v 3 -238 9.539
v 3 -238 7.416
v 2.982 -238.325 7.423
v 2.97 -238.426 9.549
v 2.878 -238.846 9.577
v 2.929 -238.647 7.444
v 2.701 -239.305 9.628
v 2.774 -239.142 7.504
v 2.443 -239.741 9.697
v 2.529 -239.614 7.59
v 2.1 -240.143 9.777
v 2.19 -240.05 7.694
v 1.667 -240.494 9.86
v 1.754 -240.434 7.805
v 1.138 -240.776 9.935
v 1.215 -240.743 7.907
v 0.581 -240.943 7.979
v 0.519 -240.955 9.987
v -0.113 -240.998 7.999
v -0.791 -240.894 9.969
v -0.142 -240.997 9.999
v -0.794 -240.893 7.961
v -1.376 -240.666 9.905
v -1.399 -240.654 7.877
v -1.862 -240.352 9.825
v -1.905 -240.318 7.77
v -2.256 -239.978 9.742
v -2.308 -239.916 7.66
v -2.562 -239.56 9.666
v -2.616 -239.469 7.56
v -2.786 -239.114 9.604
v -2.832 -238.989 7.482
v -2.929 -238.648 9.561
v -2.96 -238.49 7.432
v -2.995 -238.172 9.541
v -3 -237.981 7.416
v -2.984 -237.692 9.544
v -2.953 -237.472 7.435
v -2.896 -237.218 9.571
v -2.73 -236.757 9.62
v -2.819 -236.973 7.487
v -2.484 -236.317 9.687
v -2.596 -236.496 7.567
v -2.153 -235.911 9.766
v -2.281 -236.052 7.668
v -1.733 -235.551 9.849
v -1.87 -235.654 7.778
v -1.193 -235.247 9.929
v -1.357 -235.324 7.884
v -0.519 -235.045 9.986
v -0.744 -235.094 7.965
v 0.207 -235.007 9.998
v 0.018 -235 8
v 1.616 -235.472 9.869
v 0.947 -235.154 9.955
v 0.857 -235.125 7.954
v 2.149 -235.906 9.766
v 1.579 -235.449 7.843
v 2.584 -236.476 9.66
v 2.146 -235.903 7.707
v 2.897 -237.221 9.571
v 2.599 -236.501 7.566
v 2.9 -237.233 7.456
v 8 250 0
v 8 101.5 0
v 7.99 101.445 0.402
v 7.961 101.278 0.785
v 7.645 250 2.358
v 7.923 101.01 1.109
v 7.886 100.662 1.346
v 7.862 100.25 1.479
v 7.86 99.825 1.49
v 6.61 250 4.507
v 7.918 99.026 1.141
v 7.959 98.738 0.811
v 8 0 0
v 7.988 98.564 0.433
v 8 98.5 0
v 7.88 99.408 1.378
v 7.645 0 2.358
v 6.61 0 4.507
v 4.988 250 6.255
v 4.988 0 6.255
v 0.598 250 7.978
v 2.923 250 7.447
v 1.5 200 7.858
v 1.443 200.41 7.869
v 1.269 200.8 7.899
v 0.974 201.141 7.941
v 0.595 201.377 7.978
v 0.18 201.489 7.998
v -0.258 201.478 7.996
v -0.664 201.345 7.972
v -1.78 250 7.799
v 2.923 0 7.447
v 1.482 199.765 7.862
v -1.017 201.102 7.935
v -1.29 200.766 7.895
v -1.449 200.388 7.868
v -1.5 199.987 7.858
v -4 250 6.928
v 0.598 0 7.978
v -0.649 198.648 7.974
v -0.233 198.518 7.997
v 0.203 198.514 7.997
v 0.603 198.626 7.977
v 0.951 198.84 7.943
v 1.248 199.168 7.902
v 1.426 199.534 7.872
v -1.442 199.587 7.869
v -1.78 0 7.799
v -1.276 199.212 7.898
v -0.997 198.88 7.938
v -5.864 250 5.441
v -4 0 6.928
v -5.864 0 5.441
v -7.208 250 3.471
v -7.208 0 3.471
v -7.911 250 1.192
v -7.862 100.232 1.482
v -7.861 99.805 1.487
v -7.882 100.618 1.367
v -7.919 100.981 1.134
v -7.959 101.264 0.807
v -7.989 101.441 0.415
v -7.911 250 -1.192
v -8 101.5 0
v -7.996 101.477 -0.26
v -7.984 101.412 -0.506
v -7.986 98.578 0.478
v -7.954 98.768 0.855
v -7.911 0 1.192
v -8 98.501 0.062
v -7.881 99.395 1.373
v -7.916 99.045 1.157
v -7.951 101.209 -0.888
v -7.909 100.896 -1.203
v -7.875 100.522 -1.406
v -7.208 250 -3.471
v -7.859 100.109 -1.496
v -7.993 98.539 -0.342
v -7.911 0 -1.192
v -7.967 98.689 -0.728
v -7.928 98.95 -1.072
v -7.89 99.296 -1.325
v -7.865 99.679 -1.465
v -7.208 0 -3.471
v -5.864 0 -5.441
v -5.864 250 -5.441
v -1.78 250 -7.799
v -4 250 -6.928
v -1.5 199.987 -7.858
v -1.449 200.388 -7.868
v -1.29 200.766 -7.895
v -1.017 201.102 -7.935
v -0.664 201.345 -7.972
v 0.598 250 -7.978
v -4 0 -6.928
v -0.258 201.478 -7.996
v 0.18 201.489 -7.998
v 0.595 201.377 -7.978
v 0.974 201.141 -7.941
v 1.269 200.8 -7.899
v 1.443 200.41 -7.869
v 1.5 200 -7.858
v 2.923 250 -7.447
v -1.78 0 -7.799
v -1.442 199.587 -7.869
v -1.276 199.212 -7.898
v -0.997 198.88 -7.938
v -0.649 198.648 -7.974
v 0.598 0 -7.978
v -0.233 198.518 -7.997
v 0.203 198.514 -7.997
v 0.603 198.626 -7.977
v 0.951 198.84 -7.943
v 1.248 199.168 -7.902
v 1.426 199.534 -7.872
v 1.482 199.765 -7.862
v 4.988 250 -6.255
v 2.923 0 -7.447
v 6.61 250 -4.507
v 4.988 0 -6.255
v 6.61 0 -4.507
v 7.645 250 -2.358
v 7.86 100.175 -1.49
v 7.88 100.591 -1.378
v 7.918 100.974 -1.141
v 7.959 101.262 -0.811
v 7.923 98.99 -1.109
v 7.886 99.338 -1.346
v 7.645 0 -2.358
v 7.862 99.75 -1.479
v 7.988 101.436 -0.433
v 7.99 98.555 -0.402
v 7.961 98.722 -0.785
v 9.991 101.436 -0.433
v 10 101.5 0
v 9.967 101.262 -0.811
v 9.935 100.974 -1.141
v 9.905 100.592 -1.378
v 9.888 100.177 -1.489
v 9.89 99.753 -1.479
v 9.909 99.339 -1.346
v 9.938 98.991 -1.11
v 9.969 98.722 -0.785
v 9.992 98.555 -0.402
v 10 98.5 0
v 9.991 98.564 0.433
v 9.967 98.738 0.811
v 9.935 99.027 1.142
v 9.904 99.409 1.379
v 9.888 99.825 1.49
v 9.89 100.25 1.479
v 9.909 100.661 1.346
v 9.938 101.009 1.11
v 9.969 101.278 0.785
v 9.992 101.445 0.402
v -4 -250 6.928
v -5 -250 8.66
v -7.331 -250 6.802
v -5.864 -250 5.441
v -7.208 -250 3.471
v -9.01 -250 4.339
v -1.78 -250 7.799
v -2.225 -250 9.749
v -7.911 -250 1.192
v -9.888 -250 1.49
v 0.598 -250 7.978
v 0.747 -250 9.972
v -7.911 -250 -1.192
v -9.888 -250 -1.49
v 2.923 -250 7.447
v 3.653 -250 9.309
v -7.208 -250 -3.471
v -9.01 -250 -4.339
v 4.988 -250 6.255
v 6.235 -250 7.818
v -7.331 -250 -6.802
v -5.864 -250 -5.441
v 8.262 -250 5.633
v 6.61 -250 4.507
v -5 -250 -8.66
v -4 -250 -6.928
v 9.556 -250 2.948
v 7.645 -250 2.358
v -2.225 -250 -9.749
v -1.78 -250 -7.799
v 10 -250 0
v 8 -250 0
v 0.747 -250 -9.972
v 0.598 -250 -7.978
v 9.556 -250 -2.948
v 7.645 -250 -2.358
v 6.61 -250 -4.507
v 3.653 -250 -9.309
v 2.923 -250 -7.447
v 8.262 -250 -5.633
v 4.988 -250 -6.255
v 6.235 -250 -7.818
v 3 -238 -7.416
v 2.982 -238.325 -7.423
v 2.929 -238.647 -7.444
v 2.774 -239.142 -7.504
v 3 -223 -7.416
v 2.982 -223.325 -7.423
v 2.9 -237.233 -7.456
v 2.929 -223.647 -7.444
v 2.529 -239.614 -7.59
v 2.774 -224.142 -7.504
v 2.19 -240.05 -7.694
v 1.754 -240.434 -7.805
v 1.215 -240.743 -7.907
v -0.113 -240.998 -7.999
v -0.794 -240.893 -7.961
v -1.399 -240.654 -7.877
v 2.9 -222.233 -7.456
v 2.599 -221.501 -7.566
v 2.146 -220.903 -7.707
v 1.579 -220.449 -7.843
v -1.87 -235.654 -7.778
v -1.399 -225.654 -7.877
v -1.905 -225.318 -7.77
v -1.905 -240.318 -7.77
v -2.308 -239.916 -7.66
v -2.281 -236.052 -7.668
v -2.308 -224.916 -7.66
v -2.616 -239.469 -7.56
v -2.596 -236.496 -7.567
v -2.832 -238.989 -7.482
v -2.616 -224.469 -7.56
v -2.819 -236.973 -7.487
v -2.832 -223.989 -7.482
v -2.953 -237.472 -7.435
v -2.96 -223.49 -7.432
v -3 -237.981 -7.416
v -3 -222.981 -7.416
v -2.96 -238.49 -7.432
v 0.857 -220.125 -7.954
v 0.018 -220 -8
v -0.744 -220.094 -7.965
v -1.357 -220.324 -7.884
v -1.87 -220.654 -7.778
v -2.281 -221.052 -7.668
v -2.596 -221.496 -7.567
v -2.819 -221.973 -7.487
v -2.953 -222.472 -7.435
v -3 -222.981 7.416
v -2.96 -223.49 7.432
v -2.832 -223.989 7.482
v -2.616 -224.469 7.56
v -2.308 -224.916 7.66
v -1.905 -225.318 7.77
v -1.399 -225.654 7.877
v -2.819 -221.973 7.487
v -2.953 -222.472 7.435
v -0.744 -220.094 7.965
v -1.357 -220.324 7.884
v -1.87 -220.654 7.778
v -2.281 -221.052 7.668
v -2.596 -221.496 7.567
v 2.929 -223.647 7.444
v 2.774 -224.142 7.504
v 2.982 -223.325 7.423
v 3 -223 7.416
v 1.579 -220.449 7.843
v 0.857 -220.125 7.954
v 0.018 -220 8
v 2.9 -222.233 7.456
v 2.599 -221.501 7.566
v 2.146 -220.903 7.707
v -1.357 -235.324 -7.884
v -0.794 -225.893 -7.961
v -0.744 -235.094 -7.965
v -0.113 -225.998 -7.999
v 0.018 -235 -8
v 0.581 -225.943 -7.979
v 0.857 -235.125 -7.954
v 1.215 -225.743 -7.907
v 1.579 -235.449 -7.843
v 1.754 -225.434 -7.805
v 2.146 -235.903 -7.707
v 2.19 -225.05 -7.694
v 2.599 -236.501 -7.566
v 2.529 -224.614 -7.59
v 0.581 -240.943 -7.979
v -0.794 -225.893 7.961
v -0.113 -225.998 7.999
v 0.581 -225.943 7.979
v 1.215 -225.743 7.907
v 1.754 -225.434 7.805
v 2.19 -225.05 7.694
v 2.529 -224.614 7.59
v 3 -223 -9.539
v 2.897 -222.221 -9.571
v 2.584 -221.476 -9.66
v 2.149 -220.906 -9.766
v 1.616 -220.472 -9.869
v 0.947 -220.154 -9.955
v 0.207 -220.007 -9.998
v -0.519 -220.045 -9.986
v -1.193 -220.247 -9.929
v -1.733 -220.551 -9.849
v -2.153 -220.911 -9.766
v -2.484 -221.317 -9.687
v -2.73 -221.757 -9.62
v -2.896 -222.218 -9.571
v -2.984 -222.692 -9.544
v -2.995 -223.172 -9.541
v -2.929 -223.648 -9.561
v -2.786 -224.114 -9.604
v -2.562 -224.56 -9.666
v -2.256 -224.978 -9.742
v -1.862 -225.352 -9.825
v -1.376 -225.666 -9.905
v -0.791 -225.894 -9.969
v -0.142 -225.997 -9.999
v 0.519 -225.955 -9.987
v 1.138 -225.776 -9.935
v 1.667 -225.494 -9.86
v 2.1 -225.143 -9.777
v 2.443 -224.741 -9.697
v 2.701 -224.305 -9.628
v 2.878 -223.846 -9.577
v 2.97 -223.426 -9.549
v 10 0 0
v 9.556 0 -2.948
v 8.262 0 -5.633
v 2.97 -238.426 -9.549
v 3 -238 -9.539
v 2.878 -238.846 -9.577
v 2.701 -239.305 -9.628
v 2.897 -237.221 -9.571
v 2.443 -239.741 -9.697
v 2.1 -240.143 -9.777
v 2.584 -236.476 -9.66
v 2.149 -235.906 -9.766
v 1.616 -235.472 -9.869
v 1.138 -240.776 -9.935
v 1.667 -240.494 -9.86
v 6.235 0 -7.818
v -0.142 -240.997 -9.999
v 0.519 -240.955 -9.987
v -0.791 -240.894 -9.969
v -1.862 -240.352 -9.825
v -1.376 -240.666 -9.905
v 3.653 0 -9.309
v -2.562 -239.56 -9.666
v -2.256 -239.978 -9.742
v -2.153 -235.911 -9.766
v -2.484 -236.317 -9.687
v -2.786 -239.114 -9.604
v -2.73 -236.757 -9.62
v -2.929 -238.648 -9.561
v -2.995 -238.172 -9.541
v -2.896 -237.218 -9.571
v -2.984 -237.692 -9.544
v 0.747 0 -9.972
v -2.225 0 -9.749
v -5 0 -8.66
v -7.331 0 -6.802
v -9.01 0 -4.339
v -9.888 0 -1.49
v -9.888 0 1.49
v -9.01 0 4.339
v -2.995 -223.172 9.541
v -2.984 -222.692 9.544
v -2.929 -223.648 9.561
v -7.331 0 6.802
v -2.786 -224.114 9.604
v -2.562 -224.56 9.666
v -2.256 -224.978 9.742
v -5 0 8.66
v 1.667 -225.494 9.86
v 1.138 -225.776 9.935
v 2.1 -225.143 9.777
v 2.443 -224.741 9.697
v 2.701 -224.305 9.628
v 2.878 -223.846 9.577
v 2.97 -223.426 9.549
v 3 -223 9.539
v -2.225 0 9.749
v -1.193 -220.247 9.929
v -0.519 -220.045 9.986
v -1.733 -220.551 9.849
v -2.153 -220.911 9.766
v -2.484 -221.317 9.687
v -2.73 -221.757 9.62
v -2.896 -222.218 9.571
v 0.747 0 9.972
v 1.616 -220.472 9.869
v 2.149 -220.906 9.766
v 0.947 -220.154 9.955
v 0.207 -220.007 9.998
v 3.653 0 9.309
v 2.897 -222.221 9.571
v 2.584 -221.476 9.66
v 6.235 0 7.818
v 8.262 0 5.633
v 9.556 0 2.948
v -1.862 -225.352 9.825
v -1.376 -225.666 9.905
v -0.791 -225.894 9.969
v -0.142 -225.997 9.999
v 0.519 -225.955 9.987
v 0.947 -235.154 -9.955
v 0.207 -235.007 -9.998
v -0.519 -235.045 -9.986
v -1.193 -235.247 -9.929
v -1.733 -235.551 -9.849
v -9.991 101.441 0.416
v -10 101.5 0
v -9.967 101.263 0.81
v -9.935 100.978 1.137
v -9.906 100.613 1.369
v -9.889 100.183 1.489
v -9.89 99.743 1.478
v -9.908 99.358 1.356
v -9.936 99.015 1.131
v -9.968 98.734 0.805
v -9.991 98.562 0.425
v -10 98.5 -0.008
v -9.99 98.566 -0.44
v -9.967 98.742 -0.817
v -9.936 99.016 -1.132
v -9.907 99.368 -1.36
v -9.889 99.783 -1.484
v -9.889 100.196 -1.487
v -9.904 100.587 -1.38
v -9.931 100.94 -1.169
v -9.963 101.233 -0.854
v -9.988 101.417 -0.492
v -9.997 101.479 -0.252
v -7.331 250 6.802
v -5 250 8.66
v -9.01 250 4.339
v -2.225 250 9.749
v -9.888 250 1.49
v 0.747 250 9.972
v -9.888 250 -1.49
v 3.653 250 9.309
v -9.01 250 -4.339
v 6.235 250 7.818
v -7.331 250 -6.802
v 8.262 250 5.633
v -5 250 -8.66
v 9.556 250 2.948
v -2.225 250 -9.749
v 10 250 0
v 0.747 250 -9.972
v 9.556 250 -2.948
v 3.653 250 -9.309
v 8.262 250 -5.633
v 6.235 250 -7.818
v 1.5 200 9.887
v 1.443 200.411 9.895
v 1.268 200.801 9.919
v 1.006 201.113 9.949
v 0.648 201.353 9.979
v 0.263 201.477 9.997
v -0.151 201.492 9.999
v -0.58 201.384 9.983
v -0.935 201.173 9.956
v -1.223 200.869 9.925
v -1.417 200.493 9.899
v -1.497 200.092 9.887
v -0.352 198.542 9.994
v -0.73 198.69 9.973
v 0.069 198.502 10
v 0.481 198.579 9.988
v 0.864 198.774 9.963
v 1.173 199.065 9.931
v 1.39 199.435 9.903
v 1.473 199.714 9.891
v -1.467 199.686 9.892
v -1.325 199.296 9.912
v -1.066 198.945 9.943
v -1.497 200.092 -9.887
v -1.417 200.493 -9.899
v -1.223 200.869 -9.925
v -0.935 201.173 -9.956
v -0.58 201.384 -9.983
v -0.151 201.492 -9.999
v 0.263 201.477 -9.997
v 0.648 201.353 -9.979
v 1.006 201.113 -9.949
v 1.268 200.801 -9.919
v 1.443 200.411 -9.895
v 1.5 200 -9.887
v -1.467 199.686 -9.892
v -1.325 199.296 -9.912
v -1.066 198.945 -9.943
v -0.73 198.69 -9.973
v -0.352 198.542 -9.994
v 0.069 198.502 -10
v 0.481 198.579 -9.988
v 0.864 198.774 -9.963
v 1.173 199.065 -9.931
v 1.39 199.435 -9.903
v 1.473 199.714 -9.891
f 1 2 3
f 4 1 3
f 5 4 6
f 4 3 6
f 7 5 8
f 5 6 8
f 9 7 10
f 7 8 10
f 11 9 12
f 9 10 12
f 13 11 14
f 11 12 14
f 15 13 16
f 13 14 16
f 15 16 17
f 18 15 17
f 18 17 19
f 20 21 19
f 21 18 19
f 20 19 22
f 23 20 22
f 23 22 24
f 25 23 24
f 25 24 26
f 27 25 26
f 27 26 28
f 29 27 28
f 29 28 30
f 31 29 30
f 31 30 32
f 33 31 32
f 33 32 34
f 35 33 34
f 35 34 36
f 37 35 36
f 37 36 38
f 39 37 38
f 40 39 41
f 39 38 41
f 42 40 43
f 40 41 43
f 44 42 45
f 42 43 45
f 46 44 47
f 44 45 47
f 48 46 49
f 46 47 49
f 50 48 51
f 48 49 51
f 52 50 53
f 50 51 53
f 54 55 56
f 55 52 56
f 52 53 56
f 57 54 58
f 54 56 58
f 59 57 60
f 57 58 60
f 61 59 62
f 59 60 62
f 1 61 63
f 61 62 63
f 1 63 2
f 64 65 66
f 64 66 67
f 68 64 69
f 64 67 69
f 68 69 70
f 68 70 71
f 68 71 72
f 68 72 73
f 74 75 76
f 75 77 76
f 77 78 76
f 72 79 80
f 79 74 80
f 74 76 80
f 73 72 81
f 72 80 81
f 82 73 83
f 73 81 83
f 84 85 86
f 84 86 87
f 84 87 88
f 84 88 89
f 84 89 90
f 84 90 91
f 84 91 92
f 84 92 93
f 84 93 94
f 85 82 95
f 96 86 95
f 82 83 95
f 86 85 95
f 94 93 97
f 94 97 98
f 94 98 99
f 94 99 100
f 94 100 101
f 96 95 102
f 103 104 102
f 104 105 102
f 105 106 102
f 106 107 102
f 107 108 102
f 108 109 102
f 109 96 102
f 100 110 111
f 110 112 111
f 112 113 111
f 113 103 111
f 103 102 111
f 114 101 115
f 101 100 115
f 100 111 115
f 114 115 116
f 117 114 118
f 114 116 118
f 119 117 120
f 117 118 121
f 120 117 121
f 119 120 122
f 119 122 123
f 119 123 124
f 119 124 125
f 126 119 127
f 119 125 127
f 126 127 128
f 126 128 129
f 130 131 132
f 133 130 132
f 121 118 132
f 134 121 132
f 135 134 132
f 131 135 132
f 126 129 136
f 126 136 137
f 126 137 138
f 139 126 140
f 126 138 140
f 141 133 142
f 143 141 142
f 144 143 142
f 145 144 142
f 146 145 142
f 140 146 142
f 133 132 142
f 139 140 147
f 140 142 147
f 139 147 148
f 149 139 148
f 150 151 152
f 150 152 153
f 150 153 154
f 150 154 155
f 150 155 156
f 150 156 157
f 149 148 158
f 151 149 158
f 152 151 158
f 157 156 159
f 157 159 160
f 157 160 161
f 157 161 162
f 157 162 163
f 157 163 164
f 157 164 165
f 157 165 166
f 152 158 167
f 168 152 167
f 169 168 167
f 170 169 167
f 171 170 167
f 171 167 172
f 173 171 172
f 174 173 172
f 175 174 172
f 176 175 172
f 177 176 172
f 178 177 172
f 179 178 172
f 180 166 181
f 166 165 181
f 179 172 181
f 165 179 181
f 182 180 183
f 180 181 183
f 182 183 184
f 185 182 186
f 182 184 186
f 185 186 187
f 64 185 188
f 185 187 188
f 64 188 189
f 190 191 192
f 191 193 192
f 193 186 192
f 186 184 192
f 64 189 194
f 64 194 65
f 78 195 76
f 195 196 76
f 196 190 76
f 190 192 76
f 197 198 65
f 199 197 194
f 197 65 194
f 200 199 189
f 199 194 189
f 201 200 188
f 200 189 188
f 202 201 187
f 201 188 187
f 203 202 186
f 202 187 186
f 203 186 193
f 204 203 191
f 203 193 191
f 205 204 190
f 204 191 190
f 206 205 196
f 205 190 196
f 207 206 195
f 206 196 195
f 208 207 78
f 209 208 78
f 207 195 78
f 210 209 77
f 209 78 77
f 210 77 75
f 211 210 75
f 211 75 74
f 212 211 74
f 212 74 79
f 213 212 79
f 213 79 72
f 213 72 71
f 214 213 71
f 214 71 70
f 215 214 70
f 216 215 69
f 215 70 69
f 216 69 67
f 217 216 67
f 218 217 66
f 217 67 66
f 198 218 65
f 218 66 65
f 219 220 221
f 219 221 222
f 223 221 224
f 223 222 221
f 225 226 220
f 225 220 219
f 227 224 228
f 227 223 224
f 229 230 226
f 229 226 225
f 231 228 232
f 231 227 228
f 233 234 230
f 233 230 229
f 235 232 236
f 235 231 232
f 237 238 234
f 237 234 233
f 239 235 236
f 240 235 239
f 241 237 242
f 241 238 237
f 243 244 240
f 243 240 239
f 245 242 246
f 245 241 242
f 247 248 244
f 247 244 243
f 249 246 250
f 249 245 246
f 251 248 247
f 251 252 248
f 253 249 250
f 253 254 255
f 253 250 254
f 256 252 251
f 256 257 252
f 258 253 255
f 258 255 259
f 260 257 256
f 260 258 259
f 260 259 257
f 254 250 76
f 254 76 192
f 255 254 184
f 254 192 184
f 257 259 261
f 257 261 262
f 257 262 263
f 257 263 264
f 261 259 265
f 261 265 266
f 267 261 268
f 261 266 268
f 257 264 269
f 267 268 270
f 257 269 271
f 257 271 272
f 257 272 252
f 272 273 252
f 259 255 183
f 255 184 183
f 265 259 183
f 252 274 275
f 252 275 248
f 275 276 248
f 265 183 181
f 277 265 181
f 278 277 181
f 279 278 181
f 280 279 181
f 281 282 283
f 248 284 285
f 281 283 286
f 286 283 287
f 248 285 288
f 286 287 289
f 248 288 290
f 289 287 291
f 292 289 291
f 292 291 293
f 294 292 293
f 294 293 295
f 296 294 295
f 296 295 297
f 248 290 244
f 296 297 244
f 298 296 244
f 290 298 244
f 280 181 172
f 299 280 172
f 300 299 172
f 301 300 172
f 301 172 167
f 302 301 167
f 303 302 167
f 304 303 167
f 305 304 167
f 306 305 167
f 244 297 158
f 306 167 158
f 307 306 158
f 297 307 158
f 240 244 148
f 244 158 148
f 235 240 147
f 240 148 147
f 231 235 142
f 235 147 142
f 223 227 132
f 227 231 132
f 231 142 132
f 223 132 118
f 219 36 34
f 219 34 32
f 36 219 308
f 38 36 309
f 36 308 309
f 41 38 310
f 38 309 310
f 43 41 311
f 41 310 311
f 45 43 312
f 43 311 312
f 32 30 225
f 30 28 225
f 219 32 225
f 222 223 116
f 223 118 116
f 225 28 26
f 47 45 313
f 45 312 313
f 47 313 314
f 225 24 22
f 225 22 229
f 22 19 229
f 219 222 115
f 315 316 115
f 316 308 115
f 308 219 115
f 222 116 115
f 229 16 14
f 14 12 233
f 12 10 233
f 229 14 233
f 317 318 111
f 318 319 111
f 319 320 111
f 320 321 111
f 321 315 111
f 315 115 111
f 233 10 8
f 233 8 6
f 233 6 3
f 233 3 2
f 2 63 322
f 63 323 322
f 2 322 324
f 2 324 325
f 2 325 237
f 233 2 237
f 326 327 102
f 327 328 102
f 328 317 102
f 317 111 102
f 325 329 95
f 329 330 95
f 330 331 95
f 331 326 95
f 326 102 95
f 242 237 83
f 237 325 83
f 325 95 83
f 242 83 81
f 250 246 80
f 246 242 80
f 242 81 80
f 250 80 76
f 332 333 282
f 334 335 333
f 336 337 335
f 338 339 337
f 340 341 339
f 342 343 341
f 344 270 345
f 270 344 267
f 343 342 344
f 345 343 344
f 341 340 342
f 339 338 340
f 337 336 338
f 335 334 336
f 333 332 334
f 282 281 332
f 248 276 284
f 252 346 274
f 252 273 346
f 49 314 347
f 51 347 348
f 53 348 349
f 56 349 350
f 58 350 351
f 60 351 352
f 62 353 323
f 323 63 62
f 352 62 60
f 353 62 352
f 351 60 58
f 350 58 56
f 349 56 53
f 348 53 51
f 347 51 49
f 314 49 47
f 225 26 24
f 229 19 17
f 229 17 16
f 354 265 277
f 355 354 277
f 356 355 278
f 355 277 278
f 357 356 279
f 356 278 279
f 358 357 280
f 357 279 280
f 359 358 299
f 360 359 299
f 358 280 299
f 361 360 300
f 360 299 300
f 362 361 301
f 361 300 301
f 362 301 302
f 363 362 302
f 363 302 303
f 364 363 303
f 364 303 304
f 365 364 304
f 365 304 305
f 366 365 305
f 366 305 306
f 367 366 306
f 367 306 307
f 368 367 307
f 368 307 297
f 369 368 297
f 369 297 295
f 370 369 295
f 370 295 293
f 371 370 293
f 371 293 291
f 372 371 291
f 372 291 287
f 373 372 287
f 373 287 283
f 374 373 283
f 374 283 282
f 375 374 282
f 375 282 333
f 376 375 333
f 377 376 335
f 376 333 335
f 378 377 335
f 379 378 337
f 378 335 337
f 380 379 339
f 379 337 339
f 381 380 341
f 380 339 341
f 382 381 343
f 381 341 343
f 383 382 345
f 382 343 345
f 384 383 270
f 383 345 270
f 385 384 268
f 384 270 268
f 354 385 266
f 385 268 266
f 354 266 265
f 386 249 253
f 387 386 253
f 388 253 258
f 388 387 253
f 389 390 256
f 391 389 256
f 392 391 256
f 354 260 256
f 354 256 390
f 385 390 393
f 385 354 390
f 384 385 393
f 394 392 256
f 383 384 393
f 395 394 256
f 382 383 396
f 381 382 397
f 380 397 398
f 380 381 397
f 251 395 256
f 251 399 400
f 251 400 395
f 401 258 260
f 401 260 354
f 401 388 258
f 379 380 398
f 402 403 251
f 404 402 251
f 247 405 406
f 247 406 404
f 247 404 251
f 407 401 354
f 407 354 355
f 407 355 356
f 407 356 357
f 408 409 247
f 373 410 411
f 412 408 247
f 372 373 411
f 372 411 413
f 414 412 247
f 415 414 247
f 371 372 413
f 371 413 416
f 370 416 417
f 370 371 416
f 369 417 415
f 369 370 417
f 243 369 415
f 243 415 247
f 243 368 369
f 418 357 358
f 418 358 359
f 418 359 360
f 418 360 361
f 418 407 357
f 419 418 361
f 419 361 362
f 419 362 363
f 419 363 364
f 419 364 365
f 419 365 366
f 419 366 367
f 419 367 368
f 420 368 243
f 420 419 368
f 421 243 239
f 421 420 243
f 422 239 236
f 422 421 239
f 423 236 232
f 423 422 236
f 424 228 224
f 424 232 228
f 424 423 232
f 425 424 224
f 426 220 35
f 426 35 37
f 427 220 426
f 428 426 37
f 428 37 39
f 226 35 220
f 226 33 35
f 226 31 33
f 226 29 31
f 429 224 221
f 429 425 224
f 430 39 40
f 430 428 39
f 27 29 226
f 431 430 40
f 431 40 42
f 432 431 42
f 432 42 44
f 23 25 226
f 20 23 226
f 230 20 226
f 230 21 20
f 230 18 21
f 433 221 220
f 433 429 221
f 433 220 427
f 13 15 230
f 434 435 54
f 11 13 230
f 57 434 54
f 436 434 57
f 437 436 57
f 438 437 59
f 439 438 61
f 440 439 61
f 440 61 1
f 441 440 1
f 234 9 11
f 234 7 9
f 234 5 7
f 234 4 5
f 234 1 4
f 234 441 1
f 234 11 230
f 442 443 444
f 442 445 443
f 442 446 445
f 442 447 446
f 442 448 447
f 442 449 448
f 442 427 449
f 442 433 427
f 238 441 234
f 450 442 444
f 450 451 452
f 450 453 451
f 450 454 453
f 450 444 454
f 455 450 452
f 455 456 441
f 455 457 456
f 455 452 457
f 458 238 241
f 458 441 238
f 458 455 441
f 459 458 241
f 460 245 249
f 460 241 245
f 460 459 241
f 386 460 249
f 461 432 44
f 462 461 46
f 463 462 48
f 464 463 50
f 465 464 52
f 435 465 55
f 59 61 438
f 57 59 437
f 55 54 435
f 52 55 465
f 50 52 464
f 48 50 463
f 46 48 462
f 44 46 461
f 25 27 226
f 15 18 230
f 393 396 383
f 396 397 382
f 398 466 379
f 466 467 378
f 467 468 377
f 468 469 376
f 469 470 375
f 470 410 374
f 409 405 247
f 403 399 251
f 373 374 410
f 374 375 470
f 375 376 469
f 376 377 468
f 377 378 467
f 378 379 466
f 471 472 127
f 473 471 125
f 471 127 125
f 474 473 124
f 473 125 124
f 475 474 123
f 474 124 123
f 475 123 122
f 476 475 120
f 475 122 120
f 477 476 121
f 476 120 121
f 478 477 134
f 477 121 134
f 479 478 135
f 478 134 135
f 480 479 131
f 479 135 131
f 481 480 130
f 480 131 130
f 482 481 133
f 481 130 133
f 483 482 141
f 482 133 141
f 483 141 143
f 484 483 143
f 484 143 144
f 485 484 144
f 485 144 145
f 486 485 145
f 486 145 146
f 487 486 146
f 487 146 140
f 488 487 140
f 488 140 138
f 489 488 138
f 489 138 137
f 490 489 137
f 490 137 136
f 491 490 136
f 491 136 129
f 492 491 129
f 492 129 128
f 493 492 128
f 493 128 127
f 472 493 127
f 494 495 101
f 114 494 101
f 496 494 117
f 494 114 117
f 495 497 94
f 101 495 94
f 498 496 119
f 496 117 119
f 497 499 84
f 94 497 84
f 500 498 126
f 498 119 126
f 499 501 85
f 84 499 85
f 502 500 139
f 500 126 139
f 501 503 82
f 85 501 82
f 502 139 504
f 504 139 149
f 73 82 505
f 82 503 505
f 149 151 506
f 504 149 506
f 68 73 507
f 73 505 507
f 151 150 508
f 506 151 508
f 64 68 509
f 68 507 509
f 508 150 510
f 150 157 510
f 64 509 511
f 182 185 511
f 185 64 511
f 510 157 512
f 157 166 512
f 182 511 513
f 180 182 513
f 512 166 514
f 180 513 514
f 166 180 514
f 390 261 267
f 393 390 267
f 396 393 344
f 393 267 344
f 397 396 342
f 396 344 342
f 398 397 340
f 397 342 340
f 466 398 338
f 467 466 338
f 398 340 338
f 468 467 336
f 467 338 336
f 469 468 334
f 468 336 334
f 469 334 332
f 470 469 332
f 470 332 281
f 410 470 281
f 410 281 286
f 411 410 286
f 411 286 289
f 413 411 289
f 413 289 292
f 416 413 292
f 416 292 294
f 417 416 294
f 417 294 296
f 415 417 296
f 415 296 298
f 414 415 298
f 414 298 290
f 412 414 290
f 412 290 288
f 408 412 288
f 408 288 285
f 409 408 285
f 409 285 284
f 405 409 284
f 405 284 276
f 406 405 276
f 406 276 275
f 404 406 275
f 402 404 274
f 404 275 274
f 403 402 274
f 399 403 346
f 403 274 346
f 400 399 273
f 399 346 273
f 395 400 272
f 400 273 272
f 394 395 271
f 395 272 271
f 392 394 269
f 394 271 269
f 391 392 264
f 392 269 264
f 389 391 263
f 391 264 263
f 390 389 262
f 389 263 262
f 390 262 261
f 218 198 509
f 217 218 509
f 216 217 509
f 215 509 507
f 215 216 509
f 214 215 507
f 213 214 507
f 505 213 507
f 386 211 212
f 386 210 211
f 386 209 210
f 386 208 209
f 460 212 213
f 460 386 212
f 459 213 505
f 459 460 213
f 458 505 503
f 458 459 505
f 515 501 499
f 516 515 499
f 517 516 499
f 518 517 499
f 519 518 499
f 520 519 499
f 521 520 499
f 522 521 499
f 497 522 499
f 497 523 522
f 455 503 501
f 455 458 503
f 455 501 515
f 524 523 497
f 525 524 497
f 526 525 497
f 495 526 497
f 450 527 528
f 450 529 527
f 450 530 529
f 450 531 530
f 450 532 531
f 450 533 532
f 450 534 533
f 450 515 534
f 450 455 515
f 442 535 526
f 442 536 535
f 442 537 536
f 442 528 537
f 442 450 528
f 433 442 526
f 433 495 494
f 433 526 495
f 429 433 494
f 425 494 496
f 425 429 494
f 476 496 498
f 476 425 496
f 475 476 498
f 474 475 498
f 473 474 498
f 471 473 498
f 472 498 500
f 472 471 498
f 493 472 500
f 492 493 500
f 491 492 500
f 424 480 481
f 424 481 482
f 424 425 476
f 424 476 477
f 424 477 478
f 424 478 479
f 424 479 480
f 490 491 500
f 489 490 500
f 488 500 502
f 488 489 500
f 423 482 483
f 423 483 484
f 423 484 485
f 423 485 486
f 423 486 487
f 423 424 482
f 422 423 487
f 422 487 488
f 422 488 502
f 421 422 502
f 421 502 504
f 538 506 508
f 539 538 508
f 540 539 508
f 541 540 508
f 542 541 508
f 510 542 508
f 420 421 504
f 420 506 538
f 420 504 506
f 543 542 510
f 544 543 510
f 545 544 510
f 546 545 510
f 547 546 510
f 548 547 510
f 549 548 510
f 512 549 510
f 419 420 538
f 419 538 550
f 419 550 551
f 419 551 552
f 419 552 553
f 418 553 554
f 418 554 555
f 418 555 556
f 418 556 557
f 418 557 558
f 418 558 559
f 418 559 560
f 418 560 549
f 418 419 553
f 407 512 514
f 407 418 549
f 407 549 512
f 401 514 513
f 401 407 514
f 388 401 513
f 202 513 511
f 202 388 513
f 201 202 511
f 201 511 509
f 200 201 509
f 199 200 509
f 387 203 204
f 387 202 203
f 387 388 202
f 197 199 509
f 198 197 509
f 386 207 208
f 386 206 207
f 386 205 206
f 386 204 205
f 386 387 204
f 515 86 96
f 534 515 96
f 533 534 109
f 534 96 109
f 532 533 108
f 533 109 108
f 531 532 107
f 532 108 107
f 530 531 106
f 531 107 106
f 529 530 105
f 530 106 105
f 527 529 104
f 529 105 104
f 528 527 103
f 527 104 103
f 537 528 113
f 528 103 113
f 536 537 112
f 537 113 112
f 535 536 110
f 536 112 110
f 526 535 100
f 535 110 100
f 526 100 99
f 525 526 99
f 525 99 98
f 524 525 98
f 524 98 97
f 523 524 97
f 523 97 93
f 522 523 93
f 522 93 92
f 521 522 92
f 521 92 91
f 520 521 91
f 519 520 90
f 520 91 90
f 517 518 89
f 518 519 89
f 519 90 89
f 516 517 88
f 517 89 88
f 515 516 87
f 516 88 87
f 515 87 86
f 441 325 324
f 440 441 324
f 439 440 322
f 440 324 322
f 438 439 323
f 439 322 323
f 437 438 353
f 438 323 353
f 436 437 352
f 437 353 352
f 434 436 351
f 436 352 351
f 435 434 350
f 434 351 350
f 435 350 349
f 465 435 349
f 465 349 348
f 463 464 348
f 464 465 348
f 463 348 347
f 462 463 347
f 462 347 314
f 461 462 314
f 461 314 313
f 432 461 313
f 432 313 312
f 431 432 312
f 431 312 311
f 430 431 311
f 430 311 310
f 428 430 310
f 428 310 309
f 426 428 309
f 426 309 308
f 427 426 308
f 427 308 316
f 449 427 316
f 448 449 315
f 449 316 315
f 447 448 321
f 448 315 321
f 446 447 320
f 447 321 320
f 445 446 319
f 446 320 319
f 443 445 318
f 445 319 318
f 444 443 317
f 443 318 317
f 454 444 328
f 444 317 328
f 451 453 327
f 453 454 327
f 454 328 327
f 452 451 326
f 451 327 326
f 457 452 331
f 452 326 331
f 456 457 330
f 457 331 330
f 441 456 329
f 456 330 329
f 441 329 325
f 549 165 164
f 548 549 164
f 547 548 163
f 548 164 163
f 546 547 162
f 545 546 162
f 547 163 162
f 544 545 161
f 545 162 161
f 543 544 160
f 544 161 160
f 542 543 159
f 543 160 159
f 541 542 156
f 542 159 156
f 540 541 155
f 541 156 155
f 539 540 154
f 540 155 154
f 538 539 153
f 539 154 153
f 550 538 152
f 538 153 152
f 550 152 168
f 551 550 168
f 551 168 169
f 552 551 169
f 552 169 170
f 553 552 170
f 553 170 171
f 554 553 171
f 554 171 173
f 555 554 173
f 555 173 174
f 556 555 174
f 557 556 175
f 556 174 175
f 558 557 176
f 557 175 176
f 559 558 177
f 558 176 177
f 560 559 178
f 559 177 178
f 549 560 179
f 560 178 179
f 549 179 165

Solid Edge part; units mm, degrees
sketch "Sketch1" plane through (0, 0, 0) normal (0, -1, 0) x (1, 0, 0)
  circle A0 centre (0, 0) radius 10
  circle A1 centre (0, 0) radius 8
extrude "Protrusion1" add sketch "Sketch1" along normal mid plane 500
sketch "Sketch2" plane through (0, 0, 0) normal (0, 0, 1) x (1, 0, 0)
  circle A0 centre (0, -238) radius 3
  circle A1 centre (0, -223) radius 3
extrude "ExtrudedCutout_1" cut sketch "Sketch2" along normal mid plane 103.8089
sketch "Sketch3" plane through (0, 0, 0) normal (1, 0, 0) x (0, 1, 0)
  circle A0 centre (100, 0) radius 1.5
extrude "ExtrudedCutout_3" cut sketch "Sketch3" along normal mid plane 217.8722
sketch "Sketch4" plane through (0, 0, 0) normal (0, 0, 1) x (1, 0, 0)
  circle A0 centre (0, 200) radius 1.5
extrude "ExtrudedCutout_4" cut sketch "Sketch4" along normal mid plane 490.2317
properties material "PVC"
